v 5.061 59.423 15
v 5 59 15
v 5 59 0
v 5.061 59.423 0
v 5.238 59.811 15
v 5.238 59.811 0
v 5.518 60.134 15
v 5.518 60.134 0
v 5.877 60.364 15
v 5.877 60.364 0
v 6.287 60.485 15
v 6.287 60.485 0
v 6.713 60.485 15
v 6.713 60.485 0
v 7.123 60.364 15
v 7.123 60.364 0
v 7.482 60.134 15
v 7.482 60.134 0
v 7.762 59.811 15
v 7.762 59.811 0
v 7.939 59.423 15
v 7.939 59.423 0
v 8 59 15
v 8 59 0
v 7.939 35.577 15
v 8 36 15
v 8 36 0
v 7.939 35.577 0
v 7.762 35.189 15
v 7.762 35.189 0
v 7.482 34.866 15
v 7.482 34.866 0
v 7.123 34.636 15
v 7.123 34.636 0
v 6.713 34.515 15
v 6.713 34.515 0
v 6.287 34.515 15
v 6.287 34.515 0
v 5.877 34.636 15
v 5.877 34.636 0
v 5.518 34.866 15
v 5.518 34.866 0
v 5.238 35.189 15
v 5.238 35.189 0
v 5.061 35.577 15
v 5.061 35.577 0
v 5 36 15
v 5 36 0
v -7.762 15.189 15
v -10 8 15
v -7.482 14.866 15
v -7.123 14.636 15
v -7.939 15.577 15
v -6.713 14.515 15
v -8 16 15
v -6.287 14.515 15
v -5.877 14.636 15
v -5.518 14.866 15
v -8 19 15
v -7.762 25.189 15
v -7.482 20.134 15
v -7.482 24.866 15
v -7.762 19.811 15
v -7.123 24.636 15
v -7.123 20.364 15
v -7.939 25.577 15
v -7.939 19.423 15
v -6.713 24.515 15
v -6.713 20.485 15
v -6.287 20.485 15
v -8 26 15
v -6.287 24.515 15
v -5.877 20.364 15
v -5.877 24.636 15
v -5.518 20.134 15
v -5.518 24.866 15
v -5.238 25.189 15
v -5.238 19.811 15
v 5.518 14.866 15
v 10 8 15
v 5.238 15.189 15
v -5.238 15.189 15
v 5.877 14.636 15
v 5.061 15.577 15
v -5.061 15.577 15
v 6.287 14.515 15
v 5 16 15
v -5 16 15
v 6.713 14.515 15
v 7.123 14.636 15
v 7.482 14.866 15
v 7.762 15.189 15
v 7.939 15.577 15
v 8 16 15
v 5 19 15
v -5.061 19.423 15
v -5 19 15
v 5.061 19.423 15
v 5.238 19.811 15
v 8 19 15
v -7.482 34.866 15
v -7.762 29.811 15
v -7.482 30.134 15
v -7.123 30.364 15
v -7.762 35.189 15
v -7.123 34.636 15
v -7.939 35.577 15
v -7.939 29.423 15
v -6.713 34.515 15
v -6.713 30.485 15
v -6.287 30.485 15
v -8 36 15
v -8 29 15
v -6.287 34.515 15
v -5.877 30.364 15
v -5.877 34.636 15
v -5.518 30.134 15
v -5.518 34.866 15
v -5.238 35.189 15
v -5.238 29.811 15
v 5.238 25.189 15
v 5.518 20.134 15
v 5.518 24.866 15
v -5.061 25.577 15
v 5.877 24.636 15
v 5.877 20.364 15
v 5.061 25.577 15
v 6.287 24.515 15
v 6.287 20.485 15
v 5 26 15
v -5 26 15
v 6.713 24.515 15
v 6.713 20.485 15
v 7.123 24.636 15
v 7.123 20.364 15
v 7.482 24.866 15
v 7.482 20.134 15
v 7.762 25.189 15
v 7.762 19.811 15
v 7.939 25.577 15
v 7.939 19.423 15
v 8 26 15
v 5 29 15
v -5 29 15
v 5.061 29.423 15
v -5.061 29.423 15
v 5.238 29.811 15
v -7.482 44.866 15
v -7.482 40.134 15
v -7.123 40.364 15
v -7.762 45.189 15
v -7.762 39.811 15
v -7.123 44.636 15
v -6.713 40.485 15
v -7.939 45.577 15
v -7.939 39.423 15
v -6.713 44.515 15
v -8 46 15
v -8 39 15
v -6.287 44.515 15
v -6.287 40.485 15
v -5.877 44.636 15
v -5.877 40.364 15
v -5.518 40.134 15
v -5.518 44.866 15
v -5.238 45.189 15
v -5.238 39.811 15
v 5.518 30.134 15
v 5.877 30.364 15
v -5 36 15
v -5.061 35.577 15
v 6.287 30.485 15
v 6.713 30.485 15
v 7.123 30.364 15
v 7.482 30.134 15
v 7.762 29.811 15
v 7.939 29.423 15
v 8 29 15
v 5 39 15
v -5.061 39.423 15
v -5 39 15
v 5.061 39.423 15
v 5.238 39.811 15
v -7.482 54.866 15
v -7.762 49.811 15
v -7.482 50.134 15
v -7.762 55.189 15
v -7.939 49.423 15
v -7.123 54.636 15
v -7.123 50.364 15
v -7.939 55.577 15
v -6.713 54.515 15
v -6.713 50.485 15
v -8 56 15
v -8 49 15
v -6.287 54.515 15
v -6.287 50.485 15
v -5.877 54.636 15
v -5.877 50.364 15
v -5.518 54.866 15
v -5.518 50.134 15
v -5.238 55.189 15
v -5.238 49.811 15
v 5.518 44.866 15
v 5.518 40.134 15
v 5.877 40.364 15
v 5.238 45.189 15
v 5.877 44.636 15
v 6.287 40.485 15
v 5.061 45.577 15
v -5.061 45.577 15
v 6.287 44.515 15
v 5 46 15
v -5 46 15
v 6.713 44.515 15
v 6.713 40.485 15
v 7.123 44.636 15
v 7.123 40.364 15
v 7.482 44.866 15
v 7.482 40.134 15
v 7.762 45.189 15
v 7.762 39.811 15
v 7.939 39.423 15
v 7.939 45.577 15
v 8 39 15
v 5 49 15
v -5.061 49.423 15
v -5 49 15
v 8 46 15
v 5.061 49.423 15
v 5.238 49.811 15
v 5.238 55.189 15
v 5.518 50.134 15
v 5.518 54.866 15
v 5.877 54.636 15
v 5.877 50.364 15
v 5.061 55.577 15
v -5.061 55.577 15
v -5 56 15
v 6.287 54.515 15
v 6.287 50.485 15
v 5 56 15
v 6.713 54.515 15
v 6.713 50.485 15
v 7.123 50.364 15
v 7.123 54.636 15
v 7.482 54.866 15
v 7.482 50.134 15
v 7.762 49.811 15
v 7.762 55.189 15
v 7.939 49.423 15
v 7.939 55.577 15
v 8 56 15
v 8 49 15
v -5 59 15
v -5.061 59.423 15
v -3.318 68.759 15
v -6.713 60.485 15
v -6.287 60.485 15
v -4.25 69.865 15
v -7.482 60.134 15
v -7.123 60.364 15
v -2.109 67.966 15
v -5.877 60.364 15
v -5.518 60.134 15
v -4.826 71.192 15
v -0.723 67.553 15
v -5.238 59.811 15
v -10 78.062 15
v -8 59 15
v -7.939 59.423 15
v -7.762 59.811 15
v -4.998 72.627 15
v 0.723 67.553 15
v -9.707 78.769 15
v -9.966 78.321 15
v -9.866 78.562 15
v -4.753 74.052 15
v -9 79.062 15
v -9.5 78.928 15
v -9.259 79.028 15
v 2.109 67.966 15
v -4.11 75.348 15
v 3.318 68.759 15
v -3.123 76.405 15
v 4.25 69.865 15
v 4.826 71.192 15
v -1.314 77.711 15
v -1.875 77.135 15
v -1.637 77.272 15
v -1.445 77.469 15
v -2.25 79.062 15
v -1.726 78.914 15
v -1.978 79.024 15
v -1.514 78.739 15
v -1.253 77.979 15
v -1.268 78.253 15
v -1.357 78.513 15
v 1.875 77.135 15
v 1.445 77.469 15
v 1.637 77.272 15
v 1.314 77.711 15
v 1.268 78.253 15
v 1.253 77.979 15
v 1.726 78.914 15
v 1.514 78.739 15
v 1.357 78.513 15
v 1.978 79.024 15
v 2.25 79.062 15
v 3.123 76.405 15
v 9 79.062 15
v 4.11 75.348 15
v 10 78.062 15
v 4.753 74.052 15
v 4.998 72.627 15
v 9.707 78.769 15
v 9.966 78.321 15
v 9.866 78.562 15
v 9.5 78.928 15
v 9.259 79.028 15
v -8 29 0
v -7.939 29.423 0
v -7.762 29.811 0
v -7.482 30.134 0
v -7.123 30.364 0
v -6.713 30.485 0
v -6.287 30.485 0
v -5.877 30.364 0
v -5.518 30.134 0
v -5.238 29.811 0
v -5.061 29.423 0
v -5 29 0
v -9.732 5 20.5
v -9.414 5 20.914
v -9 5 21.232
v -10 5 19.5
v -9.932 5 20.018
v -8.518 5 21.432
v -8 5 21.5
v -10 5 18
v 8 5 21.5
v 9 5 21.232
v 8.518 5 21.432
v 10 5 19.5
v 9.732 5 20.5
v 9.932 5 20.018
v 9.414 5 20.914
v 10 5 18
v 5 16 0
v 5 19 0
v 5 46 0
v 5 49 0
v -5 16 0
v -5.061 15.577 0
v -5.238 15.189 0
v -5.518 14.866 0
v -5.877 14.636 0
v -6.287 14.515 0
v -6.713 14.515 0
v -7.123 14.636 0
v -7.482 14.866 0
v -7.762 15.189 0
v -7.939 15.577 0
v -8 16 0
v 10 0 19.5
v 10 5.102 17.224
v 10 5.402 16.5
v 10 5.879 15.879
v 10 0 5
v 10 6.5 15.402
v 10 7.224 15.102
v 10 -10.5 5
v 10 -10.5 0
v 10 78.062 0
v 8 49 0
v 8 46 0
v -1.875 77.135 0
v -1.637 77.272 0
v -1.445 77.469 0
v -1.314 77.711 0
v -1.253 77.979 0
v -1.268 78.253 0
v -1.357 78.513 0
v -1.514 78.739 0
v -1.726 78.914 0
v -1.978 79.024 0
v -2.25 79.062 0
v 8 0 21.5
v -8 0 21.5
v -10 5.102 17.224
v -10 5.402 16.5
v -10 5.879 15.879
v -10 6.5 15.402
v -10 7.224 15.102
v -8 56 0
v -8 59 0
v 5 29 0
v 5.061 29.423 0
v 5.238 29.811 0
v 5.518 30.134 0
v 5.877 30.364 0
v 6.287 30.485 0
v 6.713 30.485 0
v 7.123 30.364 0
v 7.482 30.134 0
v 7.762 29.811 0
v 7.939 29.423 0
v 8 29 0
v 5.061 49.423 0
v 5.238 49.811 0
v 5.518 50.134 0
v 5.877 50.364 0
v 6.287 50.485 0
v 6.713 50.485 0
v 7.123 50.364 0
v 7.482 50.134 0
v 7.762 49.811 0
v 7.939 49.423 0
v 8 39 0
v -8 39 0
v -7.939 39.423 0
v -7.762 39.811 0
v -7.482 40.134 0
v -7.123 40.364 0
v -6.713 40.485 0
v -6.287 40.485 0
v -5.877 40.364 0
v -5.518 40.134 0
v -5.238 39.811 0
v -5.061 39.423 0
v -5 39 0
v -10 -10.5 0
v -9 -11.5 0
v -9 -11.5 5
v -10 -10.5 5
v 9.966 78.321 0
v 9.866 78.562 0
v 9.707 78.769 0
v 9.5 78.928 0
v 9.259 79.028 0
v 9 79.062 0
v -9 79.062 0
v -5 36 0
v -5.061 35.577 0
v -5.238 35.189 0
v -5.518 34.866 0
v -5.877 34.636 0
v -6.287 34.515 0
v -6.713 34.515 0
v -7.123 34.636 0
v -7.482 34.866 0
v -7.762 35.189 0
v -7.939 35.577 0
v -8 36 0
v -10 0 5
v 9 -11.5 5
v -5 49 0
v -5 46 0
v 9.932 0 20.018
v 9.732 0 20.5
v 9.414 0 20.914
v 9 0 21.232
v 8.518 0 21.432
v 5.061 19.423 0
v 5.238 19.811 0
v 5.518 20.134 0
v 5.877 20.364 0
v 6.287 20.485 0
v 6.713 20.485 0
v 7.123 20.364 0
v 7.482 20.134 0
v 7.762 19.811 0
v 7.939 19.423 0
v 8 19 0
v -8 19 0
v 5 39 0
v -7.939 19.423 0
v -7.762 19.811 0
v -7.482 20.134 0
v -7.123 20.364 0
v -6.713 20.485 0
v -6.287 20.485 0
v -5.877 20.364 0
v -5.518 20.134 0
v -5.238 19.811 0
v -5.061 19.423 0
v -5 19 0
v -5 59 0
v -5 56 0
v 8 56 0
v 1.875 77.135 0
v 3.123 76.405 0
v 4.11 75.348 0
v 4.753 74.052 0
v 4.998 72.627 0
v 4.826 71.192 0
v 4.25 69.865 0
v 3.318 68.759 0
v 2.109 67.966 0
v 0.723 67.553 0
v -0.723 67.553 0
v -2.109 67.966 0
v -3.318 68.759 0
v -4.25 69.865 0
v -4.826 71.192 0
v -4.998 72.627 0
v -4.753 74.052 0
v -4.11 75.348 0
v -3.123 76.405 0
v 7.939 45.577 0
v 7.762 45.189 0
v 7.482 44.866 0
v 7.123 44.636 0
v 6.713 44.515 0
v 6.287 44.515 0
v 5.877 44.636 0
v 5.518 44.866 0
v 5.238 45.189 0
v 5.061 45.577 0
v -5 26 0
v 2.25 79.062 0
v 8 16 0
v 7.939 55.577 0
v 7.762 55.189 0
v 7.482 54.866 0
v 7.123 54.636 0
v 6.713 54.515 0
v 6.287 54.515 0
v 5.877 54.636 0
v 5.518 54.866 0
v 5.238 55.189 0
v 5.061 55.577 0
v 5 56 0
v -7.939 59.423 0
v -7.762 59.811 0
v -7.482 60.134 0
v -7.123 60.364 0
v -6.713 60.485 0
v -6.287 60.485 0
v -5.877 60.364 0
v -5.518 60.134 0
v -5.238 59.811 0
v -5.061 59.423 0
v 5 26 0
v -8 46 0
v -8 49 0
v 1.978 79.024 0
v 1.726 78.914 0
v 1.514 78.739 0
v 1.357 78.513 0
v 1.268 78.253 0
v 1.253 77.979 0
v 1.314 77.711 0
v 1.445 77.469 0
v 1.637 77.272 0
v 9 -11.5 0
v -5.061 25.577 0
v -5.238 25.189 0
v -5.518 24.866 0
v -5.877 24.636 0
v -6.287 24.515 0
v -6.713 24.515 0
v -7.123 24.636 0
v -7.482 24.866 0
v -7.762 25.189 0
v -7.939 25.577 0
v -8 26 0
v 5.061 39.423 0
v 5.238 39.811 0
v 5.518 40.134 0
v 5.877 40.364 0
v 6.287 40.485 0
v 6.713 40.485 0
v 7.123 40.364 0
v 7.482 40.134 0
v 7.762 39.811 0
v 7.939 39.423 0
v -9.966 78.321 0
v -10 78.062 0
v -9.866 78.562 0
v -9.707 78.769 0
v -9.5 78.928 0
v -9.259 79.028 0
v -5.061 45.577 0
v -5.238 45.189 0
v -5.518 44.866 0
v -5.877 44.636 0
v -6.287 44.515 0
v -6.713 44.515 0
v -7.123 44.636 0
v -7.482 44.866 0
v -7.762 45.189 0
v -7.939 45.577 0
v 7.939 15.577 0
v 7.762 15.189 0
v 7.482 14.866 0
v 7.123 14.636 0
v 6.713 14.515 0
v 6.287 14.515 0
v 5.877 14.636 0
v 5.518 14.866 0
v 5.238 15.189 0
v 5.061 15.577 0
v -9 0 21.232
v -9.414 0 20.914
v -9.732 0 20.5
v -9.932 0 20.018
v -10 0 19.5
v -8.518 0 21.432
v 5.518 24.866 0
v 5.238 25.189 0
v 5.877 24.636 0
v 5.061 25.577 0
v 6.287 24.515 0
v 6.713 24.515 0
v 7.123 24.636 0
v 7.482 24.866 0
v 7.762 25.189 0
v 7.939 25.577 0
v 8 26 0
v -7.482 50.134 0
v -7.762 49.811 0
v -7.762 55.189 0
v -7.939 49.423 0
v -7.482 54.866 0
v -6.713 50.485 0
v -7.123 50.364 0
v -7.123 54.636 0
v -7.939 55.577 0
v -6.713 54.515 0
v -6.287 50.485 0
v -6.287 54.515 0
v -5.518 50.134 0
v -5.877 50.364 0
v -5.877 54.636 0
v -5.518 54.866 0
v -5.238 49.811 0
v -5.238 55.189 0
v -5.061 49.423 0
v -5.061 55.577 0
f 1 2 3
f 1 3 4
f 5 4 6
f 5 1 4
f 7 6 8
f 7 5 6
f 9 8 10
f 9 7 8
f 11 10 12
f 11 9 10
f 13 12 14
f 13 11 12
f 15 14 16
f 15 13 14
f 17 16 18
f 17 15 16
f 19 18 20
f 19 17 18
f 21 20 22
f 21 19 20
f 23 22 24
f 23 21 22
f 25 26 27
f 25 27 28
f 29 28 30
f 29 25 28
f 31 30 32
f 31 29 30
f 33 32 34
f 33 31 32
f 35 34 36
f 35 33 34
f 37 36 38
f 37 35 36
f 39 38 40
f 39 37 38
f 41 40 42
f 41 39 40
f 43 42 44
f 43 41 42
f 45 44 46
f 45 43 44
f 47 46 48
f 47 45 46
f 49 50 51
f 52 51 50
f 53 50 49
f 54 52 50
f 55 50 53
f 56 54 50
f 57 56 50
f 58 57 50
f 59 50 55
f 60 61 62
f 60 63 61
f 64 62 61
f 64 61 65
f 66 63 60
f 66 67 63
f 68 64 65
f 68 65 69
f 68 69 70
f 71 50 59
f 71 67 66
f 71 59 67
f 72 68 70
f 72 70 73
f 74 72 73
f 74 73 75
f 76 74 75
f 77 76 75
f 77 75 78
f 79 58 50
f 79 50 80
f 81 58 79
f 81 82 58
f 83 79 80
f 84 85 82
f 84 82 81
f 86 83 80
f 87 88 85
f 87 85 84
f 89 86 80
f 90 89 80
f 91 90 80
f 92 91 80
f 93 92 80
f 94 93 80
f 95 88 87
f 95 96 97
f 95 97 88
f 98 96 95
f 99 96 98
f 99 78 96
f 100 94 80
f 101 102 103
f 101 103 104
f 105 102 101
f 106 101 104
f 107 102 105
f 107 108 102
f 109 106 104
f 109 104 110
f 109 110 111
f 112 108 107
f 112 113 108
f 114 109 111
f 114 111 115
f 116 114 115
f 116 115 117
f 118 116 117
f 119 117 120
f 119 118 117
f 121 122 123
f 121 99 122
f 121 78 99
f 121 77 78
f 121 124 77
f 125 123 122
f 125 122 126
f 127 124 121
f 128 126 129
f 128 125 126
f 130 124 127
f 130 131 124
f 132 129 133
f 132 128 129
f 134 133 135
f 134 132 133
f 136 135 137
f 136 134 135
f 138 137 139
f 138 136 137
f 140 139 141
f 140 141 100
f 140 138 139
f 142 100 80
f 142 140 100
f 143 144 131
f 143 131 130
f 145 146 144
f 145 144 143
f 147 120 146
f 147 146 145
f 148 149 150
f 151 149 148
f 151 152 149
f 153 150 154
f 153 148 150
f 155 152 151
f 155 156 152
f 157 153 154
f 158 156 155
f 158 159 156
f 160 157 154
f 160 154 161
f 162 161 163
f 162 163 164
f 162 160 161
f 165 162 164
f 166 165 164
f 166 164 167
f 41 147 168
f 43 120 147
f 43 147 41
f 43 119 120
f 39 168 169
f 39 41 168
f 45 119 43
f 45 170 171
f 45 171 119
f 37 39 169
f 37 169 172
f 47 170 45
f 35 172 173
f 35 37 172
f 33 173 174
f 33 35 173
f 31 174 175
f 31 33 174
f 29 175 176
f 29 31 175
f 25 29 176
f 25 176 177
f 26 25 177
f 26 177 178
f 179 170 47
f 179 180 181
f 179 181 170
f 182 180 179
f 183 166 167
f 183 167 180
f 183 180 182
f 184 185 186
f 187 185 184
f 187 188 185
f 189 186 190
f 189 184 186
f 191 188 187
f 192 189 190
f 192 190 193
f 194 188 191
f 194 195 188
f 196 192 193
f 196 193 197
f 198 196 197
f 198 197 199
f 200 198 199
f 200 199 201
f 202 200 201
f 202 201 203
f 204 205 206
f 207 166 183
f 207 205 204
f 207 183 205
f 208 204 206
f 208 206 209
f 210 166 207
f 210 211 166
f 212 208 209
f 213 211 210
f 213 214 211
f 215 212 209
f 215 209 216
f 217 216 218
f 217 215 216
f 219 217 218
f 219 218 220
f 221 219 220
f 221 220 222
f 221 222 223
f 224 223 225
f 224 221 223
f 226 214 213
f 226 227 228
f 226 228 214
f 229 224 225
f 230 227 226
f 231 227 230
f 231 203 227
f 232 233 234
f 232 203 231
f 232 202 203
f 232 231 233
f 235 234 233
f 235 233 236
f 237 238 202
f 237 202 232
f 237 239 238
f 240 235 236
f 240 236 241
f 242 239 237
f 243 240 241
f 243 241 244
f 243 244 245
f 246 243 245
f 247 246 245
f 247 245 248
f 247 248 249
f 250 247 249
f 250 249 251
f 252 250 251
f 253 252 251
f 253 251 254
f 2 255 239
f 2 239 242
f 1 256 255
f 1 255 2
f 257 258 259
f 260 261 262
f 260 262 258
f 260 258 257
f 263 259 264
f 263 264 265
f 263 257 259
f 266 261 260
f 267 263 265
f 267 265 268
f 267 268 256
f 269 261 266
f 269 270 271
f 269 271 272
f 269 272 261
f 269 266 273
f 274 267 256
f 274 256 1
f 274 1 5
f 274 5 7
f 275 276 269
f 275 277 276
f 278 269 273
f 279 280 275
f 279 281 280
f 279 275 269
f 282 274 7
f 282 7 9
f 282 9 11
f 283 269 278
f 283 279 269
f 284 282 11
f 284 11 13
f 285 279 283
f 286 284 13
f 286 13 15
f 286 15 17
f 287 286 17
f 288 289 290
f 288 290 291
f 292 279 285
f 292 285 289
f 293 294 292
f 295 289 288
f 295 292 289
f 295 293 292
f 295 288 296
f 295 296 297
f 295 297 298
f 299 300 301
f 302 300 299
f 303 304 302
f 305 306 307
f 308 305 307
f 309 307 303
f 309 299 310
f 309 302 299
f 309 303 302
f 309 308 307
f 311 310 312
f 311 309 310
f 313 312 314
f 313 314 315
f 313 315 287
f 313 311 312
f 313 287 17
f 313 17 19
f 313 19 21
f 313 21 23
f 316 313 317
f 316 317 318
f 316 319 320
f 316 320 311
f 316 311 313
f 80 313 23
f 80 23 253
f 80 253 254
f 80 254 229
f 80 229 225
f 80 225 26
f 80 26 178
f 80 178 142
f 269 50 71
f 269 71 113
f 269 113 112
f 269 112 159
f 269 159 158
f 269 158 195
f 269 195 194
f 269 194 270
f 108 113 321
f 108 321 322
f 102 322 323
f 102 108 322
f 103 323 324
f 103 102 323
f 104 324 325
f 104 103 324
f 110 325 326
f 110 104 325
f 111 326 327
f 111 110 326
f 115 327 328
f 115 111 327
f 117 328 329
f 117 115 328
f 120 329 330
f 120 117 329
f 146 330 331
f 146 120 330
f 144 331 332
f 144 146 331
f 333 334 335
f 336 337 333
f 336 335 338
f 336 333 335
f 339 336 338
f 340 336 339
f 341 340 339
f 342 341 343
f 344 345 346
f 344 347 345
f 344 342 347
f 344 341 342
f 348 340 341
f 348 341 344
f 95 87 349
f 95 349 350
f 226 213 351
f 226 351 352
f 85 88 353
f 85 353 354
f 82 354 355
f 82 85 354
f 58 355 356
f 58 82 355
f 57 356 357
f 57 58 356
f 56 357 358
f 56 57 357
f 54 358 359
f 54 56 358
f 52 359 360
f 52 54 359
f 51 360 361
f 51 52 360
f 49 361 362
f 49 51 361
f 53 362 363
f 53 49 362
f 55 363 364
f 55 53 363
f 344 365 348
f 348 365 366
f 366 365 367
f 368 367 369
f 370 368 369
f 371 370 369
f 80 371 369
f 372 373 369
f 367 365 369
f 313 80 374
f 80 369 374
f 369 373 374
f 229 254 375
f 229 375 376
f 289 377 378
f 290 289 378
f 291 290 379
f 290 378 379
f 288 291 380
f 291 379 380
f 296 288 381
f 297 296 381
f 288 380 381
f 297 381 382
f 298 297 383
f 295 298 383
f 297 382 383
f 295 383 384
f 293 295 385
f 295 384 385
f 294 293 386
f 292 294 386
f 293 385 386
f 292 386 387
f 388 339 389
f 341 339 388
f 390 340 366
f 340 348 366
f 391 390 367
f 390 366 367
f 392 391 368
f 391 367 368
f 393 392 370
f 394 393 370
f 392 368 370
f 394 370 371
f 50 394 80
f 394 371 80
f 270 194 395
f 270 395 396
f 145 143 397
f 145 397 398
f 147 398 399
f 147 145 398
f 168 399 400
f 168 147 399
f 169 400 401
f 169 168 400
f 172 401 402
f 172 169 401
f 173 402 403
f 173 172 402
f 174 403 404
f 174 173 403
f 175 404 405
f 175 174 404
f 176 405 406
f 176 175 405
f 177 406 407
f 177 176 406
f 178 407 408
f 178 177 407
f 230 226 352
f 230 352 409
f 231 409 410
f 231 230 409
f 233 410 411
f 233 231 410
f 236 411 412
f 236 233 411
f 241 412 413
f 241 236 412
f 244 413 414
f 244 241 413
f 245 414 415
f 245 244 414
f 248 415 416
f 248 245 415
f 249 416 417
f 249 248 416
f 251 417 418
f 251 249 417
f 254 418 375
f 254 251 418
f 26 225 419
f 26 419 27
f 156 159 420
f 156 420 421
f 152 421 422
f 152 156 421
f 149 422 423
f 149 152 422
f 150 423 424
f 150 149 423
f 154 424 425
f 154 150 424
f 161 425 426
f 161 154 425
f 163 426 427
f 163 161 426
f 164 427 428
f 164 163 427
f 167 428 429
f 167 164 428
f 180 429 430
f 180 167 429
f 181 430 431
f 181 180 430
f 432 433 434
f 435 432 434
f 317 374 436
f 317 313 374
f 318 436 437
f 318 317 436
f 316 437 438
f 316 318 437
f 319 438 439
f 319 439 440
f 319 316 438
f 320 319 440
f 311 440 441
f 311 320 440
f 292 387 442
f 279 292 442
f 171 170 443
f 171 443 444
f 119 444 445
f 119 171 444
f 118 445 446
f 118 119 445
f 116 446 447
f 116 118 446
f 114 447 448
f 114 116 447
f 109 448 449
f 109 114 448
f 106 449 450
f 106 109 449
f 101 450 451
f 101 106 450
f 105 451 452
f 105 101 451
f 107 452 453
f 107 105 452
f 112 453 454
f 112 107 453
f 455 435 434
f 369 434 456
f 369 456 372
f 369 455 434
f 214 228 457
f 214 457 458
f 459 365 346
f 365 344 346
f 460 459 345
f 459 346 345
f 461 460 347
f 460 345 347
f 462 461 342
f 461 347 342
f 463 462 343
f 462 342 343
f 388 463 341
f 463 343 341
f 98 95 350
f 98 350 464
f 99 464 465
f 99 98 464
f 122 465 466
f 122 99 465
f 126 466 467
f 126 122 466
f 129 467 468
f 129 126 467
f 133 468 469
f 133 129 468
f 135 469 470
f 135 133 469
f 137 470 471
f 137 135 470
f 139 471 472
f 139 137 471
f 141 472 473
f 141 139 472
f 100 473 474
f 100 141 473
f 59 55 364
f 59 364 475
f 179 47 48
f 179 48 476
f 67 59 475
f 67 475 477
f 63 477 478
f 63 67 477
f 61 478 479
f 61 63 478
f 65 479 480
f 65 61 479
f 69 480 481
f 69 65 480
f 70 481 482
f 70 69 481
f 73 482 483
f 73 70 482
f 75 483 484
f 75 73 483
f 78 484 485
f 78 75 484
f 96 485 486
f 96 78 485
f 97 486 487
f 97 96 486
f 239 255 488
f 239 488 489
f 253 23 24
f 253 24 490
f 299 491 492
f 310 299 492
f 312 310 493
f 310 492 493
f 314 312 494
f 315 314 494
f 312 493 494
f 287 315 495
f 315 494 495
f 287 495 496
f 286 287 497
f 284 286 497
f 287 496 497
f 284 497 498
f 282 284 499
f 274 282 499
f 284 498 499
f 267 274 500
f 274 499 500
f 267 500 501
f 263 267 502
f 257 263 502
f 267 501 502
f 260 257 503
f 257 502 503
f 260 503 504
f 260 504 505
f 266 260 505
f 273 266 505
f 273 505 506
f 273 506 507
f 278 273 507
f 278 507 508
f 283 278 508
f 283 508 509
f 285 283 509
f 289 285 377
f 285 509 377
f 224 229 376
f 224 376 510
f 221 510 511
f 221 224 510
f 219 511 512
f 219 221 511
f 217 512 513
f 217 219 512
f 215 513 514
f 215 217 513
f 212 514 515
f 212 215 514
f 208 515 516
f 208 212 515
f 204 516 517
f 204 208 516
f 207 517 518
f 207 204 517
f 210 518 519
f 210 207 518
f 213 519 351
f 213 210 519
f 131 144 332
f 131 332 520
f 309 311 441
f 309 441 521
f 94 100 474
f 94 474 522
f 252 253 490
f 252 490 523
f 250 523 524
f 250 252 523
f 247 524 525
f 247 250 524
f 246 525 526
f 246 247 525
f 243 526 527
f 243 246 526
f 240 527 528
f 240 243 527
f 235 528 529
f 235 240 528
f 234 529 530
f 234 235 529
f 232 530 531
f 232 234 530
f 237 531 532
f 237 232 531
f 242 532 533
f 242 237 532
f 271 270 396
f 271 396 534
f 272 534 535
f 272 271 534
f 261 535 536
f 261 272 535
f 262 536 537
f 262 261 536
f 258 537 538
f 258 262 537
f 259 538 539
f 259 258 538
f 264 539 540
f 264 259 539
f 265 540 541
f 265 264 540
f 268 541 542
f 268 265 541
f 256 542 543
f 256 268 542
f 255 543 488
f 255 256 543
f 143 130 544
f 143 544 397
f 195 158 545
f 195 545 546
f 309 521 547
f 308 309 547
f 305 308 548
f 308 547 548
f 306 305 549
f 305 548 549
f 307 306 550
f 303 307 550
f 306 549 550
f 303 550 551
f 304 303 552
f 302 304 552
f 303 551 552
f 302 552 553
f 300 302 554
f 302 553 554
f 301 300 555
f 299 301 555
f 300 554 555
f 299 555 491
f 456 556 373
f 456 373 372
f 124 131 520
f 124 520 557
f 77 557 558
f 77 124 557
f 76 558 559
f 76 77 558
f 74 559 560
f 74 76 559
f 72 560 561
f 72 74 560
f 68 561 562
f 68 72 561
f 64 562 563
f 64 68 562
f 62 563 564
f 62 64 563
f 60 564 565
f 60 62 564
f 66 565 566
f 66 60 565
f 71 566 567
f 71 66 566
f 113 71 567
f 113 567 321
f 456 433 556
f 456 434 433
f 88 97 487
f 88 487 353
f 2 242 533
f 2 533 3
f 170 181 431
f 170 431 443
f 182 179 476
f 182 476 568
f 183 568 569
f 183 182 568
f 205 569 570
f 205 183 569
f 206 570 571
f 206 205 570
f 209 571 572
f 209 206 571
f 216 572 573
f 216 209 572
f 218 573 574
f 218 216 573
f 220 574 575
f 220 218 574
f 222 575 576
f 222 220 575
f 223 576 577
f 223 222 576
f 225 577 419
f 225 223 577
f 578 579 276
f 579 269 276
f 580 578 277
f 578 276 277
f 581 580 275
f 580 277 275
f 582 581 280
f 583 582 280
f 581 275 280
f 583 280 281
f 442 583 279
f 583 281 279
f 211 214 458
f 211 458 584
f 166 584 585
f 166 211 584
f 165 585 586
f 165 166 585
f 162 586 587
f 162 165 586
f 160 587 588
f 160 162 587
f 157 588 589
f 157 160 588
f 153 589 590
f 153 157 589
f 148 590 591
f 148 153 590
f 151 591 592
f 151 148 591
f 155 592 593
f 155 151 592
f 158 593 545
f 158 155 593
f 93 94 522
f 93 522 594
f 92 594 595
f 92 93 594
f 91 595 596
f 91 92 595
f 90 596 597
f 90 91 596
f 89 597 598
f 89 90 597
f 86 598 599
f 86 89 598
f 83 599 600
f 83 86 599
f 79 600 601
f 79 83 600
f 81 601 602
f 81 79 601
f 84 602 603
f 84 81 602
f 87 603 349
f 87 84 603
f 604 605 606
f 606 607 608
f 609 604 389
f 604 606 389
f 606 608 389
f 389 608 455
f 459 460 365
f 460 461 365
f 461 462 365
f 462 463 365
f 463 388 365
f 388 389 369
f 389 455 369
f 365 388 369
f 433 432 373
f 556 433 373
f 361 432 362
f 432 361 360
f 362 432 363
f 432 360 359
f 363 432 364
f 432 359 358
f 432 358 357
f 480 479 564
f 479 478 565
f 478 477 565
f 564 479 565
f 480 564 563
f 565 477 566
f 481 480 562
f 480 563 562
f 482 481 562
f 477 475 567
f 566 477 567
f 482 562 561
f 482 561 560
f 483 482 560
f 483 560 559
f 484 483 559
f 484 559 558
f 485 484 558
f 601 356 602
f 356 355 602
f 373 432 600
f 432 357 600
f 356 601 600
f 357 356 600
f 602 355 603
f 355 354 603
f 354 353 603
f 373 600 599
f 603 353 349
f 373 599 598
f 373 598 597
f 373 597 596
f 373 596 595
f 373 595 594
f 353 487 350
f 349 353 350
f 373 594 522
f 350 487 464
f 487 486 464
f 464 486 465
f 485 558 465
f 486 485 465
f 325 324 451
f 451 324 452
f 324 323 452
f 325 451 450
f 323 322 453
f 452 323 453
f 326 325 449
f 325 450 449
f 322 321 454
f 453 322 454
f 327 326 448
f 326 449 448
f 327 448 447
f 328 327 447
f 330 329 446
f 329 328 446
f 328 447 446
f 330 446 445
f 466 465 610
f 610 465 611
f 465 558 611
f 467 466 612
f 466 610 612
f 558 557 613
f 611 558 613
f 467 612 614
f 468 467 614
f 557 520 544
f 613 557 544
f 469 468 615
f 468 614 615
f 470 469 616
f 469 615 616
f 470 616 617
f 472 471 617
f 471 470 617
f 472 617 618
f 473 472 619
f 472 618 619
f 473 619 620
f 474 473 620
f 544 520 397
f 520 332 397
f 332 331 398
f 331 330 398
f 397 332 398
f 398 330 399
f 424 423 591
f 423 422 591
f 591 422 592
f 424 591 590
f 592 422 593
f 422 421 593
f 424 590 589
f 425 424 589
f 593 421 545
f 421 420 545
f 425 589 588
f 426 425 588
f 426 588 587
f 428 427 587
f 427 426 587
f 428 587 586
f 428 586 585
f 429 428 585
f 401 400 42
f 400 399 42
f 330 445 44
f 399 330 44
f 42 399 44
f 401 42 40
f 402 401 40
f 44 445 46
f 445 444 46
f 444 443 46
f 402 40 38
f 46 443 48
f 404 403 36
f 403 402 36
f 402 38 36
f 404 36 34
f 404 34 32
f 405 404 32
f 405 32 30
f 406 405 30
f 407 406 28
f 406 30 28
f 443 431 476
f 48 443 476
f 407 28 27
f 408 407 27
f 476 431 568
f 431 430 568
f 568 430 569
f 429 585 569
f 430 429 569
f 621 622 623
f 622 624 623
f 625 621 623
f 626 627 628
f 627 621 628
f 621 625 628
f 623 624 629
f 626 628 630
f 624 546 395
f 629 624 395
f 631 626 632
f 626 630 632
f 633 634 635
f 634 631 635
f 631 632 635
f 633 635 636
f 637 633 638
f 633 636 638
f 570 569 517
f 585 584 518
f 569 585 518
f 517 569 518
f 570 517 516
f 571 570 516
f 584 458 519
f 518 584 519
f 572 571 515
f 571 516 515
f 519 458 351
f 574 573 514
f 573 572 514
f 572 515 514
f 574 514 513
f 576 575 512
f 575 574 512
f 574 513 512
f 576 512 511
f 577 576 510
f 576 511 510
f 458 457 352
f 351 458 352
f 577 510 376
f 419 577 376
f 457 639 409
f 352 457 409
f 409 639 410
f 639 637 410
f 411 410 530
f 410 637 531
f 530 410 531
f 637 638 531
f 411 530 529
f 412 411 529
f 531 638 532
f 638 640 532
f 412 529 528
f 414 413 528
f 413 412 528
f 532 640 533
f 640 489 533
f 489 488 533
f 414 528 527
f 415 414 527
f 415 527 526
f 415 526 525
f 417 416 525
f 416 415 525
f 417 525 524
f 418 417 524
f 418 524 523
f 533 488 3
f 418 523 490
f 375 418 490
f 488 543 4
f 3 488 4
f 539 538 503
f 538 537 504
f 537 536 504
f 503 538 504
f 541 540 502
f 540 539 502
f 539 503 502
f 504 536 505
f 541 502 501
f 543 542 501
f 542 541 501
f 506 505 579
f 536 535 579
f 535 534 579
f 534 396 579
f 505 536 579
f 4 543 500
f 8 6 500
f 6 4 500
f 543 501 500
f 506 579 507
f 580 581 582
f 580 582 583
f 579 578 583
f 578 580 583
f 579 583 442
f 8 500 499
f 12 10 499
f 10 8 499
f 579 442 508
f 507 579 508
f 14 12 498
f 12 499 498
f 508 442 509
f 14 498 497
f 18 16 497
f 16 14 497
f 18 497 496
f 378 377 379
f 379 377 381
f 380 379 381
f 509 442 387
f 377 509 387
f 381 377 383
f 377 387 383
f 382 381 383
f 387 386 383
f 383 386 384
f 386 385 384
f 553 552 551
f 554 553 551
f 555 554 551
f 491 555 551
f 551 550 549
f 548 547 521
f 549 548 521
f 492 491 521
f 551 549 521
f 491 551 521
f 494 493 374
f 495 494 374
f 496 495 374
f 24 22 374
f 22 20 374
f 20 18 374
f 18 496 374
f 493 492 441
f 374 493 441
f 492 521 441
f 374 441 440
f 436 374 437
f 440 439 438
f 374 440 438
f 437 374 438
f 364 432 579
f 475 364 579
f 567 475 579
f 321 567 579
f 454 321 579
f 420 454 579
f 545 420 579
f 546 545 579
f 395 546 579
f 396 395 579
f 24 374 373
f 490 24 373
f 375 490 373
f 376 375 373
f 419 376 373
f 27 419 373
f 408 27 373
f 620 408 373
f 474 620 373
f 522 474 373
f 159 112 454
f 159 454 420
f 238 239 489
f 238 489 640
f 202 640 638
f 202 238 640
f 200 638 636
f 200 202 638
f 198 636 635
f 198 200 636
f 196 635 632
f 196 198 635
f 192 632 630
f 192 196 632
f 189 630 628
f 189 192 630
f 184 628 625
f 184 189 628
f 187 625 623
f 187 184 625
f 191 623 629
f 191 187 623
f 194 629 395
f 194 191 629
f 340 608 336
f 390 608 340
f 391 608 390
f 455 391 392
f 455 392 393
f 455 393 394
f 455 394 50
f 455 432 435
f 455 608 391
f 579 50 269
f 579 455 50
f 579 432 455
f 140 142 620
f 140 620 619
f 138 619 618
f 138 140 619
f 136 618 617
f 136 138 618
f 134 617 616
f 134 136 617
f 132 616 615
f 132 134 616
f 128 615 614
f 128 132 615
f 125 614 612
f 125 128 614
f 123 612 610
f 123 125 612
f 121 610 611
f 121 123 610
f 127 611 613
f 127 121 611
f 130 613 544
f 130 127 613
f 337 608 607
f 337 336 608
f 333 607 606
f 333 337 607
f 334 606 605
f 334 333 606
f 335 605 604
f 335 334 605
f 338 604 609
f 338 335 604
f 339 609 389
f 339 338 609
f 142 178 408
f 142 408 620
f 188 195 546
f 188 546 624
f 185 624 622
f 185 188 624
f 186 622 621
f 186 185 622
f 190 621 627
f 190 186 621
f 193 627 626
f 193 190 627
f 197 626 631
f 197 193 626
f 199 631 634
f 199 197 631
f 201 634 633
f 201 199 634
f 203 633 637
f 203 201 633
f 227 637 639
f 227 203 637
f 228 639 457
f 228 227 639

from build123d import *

# Parameters (mm, degrees)
P_IDAT_VYSUNUT_M1_DEPTH  = 15
ODEBRAT_VYSUNUT_M1_DEPTH = 82.091450741
LINPOLE1_COUNT           = 5
LINPOLE1_PITCH           = 10
SKICA3_W                 = 20
SKICA3_H                 = 5
P_IDAT_VYSUNUT_M2_DEPTH  = 11.5
ZKOSEN_1_SIZE            = 1
ZAOBLIT1_R               = 1
SKICA4_W                 = 20
SKICA4_H                 = 5
P_IDAT_VYSUNUT_M3_DEPTH  = 6.5
ZAOBLIT2_R               = 2
ZAOBLIT3_R               = 3


with BuildPart() as part:
    # Skica1 → Přidat vysunutím1 (new body)
    with BuildSketch(Plane.XY):
        with BuildLine():
            Line((-2.25, 79.062148865), (-10, 79.062148865))
            Line((-10, 79.062148865), (-10, 0))
            Line((-10, 0), (10, 0))
            Line((10, 0), (10, 79.062148865))
            Line((10, 79.062148865), (2.25, 79.062148865))
            ThreePointArc((2.25, 79.062148865), (1.268413323, 78.253166128), (1.875, 77.135124054))
            ThreePointArc((1.875, 77.135124054), (0, 67.5), (-1.875, 77.135124054))
            ThreePointArc((-1.875, 77.135124054), (-1.268413323, 78.253166128), (-2.25, 79.062148865))
        make_face()
    extrude(amount=P_IDAT_VYSUNUT_M1_DEPTH)

    # Skica2 → Odebrat vysunutím1 (cut, through all)
    with BuildSketch(Plane.XY.offset(15)):
        with BuildLine():
            Line((-8, 56), (-8, 59))
            ThreePointArc((-8, 59), (-6.5, 60.5), (-5, 59))
            Line((-5, 59), (-5, 56))
            ThreePointArc((-5, 56), (-6.5, 54.5), (-8, 56))
        make_face()
        with BuildLine():
            Line((5, 56), (5, 59))
            ThreePointArc((5, 59), (6.5, 60.5), (8, 59))
            Line((8, 59), (8, 56))
            ThreePointArc((8, 56), (6.5, 54.5), (5, 56))
        make_face()
    odebrat_vysunut_m1 = extrude(amount=-ODEBRAT_VYSUNUT_M1_DEPTH, mode=Mode.SUBTRACT)

    # LinPole1: Odebrat vysunutím1 ×5
    with Locations(*[(0, -i * LINPOLE1_PITCH, 0) for i in range(1, LINPOLE1_COUNT)]):
        add(odebrat_vysunut_m1, mode=Mode.SUBTRACT)

    # Skica3 → Přidat vysunutím2 (add)
    with BuildSketch(Plane.XZ):
        with Locations((0, 2.5)):
            Rectangle(SKICA3_W, SKICA3_H)
    extrude(amount=P_IDAT_VYSUNUT_M2_DEPTH)

    # Zkosení1
    zkosen_1_edges = [part.edges().sort_by_distance(p)[0] for p in [
        (-10, -11.5, 2.5),
        (10, -11.5, 2.5),
    ]]
    chamfer(zkosen_1_edges, length=ZKOSEN_1_SIZE)

    # Zaoblit1
    zaoblit1_edges = [part.edges().sort_by_distance(p)[0] for p in [
        (10, 79.062148865, 7.5),
        (-10, 79.062148865, 7.5),
    ]]
    fillet(zaoblit1_edges, radius=ZAOBLIT1_R)

    # Skica4 → Přidat vysunutím3 (add)
    with BuildSketch(Plane.XY.offset(15)):
        with Locations((0, 2.5)):
            Rectangle(SKICA4_W, SKICA4_H)
    extrude(amount=P_IDAT_VYSUNUT_M3_DEPTH)

    # Zaoblit2
    zaoblit2_edges = [part.edges().sort_by_distance(p)[0] for p in [
        (-10, 2.5, 21.5),
        (10, 2.5, 21.5),
    ]]
    fillet(zaoblit2_edges, radius=ZAOBLIT2_R)

    # Zaoblit3
    zaoblit3_edges = [part.edges().sort_by_distance(p)[0] for p in [
        (0, 5, 15),
    ]]
    fillet(zaoblit3_edges, radius=ZAOBLIT3_R)


solid = part.part
